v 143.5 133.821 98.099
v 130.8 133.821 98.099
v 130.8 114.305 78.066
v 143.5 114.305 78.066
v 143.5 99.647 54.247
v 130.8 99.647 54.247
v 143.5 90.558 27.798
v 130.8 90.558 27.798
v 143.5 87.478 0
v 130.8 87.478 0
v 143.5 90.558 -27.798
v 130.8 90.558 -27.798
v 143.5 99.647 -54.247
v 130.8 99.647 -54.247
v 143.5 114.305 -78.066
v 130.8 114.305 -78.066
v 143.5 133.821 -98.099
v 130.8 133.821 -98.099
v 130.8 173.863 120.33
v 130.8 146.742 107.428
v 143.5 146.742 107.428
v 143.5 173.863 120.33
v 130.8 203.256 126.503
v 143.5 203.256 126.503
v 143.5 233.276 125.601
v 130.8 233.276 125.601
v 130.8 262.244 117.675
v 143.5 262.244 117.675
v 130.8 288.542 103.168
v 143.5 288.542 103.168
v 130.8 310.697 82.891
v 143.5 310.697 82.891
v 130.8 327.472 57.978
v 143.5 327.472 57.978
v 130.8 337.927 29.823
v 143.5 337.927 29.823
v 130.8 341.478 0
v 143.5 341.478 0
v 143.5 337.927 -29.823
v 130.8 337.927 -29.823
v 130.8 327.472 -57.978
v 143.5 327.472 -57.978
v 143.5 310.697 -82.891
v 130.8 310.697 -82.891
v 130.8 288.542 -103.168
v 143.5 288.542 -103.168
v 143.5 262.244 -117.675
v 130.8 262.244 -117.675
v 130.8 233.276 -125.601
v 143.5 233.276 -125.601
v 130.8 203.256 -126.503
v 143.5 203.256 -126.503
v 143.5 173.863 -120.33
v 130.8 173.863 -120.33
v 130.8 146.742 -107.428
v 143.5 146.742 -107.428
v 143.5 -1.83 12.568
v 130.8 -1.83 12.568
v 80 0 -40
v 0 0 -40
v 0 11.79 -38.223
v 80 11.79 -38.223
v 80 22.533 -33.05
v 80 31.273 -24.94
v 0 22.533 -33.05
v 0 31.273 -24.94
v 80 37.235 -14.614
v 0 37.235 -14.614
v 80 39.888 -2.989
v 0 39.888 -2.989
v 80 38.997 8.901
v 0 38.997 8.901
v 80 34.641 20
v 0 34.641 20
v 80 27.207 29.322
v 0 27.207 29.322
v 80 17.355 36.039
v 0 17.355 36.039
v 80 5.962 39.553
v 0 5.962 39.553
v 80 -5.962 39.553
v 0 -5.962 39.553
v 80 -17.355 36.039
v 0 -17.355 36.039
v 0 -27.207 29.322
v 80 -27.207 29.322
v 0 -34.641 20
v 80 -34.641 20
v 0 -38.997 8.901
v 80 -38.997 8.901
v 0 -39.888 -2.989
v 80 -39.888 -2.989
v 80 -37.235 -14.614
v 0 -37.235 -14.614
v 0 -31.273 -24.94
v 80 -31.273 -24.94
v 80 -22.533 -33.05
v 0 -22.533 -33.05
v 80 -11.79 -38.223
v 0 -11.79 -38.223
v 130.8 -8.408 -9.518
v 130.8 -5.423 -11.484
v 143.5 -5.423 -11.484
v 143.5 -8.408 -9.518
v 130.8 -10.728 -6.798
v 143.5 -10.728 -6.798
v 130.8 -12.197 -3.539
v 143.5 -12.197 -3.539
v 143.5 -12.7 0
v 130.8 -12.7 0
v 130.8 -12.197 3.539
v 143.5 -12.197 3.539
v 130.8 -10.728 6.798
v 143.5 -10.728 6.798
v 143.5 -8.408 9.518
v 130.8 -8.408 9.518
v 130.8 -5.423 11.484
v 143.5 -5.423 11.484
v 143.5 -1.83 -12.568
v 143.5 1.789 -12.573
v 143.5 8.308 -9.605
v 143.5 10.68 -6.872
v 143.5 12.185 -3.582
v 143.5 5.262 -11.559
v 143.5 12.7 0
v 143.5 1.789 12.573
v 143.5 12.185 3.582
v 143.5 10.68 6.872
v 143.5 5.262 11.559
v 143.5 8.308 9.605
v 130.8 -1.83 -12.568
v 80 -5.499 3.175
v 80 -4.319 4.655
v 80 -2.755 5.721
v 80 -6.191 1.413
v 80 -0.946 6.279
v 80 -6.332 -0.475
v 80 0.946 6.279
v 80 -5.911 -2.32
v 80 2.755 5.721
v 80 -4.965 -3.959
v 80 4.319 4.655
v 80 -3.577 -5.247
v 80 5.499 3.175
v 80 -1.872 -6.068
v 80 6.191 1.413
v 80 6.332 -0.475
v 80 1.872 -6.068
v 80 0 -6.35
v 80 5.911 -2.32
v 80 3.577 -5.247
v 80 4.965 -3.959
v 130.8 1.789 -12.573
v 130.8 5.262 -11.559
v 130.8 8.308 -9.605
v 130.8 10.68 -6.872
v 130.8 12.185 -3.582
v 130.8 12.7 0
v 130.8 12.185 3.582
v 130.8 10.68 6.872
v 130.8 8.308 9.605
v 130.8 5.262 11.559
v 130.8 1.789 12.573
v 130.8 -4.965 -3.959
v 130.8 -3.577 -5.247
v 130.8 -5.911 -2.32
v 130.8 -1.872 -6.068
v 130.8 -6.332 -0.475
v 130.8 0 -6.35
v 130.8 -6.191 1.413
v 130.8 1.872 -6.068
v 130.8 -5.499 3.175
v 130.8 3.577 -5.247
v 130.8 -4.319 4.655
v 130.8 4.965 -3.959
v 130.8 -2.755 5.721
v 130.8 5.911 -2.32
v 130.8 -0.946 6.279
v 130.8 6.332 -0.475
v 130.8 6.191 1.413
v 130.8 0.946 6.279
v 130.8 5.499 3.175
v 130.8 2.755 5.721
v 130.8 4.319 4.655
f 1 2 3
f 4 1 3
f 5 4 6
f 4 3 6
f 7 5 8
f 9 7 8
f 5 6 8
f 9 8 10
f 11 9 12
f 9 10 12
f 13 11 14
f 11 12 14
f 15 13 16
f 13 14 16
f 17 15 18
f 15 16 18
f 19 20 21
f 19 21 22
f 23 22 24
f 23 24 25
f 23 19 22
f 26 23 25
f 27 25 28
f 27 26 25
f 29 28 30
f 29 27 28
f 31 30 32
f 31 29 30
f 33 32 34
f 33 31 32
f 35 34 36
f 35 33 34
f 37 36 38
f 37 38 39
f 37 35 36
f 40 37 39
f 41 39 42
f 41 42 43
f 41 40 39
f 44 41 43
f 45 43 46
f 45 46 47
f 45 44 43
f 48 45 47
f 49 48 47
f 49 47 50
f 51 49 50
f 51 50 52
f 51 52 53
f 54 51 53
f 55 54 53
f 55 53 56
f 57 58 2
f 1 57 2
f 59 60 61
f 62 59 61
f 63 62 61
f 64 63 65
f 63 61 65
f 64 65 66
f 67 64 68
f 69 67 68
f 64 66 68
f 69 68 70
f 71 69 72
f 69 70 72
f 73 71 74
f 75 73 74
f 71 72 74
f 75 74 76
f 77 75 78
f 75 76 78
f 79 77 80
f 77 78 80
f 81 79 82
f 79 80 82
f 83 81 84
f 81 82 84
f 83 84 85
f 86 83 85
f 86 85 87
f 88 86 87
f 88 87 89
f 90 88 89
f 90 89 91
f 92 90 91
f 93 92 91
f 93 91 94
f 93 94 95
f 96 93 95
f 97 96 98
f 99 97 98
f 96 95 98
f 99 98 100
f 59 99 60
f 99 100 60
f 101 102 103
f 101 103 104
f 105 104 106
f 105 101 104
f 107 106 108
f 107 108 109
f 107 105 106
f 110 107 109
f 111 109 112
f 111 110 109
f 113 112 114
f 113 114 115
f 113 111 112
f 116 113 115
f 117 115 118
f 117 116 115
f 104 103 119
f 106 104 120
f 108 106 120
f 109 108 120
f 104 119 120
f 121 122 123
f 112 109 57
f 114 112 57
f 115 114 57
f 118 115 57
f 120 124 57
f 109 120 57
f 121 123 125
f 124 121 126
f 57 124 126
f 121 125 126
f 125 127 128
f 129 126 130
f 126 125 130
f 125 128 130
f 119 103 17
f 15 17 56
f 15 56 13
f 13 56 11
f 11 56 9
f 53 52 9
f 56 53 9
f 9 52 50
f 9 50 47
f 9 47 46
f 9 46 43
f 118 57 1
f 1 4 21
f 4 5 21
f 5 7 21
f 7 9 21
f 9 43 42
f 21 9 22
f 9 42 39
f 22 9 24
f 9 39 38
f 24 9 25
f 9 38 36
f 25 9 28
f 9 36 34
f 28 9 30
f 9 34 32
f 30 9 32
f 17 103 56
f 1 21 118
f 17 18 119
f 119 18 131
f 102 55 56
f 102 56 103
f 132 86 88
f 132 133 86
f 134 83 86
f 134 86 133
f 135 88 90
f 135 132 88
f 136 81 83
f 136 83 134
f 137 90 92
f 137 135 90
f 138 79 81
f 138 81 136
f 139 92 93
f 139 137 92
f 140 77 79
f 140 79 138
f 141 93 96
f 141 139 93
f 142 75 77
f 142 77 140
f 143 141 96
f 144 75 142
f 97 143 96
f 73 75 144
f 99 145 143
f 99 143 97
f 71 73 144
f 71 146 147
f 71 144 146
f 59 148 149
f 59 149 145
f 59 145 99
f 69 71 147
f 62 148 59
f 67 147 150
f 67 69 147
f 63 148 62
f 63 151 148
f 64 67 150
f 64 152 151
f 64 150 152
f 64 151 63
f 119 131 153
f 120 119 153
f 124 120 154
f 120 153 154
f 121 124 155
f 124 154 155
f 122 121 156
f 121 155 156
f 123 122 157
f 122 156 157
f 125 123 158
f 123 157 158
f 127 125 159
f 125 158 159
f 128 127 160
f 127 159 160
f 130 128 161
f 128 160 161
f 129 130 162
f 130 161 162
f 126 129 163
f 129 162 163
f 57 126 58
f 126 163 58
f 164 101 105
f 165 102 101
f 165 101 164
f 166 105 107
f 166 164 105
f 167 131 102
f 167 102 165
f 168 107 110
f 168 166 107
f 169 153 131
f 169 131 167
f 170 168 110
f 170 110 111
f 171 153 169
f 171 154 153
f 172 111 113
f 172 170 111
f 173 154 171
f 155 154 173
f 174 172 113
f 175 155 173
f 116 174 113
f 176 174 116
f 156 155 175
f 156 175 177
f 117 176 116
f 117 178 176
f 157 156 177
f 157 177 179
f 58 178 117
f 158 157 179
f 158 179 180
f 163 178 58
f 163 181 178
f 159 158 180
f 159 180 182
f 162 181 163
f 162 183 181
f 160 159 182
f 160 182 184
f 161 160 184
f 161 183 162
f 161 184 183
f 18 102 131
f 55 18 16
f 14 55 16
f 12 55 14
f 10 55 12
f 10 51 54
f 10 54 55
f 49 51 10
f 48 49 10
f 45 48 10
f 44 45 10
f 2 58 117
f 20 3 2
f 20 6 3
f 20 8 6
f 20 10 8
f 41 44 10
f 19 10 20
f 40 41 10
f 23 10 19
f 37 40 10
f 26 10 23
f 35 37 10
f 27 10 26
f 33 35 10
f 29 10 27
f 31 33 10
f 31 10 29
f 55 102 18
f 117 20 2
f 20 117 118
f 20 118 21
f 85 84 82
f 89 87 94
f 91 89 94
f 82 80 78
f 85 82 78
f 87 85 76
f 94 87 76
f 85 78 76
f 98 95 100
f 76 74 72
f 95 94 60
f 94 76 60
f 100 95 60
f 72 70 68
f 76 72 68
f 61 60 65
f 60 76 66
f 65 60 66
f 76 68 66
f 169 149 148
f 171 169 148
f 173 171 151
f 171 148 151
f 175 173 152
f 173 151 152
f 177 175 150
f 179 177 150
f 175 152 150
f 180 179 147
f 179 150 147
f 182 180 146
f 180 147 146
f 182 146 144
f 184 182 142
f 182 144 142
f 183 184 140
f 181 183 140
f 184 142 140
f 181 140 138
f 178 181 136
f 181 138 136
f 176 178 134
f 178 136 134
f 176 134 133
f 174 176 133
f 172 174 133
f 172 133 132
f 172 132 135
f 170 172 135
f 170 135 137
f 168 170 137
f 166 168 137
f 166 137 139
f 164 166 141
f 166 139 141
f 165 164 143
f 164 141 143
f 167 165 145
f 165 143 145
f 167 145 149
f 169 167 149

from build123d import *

# Parameters (mm, degrees)
CROQUIS1_R              = 40
SALIENTE_EXTRUIR1_DEPTH = 80
CROQUIS2_R              = 6.35
SALIENTE_EXTRUIR2_DEPTH = 50.8
CROQUIS3_R              = 12.7
SALIENTE_EXTRUIR3_DEPTH = 12.7
SALIENTE_EXTRUIR4_DEPTH = 12.7


with BuildPart() as part:
    # Croquis1 → Saliente-Extruir1 (new body)
    with BuildSketch(Plane(origin=(0, 0, 0), x_dir=(0, 0, -1), z_dir=(1, 0, 0))):
        Circle(CROQUIS1_R)
    extrude(amount=SALIENTE_EXTRUIR1_DEPTH)

    # Croquis2 → Saliente-Extruir2 (add)
    with BuildSketch(Plane(origin=(80, 0, 0), x_dir=(0, 0, -1), z_dir=(1, 0, 0))):
        Circle(CROQUIS2_R)
    extrude(amount=SALIENTE_EXTRUIR2_DEPTH)

    # Croquis3 → Saliente-Extruir3 (add)
    with BuildSketch(Plane(origin=(130.8, 0, 0), x_dir=(0, 0, -1), z_dir=(1, 0, 0))):
        Circle(CROQUIS3_R)
    extrude(amount=SALIENTE_EXTRUIR3_DEPTH)

    # Croquis4 → Saliente-Extruir4 (add)
    with BuildSketch(Plane.ZY.offset(-130.8)):
        with BuildLine():
            Line((11.483957814, -5.422980079), (107.428083159, 146.742000736))
            ThreePointArc((107.428083159, 146.742000736), (0, 341.478305247), (-107.428083159, 146.742000736))
            Line((-107.428083159, 146.742000736), (-11.483957814, -5.422980079))
            ThreePointArc((-11.483957814, -5.422980079), (0, -12.7), (11.483957814, -5.422980079))
        make_face()
        with BuildLine():
            Line((12.567527858, -1.829547361), (98.098634635, 133.820646696))
            ThreePointArc((98.098634635, 133.820646696), (0, 87.478305247), (-98.098634635, 133.820646696))
            Line((-98.098634635, 133.820646696), (-12.567527858, -1.829547361))
            ThreePointArc((-12.567527858, -1.829547361), (0, 12.7), (12.567527858, -1.829547361))
        make_face(mode=Mode.SUBTRACT)
    extrude(amount=-SALIENTE_EXTRUIR4_DEPTH)


solid = part.part
